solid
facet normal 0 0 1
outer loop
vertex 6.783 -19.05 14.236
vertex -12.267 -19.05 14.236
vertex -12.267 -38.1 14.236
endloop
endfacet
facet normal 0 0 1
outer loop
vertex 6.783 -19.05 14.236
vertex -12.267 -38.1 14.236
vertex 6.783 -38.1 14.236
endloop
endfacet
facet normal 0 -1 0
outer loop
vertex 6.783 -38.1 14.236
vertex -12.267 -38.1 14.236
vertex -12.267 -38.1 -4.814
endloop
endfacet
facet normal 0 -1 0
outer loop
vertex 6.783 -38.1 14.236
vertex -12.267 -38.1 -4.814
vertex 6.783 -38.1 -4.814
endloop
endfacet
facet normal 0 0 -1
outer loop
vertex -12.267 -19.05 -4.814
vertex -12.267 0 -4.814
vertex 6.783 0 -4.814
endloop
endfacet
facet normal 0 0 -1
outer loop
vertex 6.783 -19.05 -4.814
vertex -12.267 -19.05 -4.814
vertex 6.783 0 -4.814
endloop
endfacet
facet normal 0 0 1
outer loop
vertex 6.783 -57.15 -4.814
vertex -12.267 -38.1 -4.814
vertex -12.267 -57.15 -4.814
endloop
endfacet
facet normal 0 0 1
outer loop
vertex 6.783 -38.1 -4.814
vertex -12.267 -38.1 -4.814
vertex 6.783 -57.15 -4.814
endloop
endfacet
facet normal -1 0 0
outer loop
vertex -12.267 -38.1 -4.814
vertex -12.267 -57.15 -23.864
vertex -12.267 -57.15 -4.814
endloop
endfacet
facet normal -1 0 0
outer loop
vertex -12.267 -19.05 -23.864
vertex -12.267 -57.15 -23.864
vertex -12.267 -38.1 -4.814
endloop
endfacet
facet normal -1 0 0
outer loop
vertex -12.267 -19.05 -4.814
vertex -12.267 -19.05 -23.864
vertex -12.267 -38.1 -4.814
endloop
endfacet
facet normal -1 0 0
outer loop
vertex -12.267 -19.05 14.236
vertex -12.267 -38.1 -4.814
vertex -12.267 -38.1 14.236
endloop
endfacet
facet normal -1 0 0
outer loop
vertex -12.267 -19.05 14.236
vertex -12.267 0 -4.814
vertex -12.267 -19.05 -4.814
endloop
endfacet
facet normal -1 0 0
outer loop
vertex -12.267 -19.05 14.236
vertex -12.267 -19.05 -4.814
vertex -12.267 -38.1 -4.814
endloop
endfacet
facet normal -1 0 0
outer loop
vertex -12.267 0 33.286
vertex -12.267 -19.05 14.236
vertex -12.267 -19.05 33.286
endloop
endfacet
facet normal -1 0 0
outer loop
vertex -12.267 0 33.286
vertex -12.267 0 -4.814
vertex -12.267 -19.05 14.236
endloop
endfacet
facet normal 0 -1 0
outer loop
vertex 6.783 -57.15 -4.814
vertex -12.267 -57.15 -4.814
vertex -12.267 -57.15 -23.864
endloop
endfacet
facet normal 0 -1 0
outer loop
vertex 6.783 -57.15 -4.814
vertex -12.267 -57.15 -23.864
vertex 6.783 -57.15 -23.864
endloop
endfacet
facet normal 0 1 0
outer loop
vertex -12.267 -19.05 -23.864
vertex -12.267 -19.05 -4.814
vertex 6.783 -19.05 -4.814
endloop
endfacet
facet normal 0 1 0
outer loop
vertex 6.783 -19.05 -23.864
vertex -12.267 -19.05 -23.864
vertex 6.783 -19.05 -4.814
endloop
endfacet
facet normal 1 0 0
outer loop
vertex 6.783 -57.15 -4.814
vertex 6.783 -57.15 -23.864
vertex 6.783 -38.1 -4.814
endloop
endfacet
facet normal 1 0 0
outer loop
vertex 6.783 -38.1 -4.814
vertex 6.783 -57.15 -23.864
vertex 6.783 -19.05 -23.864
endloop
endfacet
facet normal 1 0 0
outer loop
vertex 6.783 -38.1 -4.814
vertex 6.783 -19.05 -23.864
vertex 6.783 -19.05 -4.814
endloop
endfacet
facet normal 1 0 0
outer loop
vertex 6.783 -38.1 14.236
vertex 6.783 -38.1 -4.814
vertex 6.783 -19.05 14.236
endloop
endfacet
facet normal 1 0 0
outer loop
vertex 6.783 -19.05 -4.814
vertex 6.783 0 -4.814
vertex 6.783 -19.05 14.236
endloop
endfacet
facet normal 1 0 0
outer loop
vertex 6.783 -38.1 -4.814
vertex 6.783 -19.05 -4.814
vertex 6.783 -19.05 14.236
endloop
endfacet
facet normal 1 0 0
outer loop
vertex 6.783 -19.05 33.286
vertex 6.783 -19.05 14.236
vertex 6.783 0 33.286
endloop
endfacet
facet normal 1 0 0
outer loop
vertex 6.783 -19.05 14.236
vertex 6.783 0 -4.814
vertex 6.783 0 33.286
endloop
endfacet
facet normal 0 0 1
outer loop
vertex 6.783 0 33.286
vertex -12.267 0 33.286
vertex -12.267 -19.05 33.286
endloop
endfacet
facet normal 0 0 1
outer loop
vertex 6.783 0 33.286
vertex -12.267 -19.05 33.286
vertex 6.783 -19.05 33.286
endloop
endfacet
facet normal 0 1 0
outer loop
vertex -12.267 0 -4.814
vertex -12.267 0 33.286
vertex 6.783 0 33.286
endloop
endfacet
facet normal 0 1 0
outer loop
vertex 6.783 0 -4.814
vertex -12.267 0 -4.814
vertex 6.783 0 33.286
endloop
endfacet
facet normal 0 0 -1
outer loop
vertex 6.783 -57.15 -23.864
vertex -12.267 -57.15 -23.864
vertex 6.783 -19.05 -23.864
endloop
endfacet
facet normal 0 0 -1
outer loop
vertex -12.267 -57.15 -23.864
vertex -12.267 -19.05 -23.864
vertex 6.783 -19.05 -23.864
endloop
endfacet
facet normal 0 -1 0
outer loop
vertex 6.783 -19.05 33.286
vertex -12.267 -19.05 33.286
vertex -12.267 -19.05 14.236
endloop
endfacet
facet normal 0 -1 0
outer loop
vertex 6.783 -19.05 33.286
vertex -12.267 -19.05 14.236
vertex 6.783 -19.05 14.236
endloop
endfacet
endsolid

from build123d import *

# Parameters (mm, degrees)
F0_W     = 19.05
F0_H     = 38.1
F1_DEPTH = 19.05
F2_W     = 19.05
F2_H     = 19.05
F3_DEPTH = 19.05
F4_W     = 19.05
F4_H     = 19.05
F5_DEPTH = 19.05
F6_W     = 19.05
F6_H     = 19.05
F7_DEPTH = 19.05


with BuildPart() as f1:
    # F0 (on Front) → F1 (new body)
    with BuildSketch(Plane.XZ):
        with Locations((-2.74175, 14.235811)):
            Rectangle(F0_W, F0_H)
    extrude(amount=F1_DEPTH)

    # F2 (on face) → F3 (join)
    with BuildSketch(Plane.XZ.offset(19.05)):
        with Locations((-2.74175, 4.710811)):
            Rectangle(F2_W, F2_H)
    extrude(amount=F3_DEPTH)

    # F4 (on face) → F5 (join)
    with BuildSketch(Plane(origin=(0, 0, -4.814189), x_dir=(1, 0, 0), z_dir=(0, 0, -1))):
        with Locations((-2.74175, 28.575)):
            Rectangle(F4_W, F4_H)
    extrude(amount=F5_DEPTH)

    # F6 (on face) → F7 (join)
    with BuildSketch(Plane.XZ.offset(38.1)):
        with Locations((-2.74175, -14.339189)):
            Rectangle(F6_W, F6_H)
    extrude(amount=F7_DEPTH)


solid = f1.part
